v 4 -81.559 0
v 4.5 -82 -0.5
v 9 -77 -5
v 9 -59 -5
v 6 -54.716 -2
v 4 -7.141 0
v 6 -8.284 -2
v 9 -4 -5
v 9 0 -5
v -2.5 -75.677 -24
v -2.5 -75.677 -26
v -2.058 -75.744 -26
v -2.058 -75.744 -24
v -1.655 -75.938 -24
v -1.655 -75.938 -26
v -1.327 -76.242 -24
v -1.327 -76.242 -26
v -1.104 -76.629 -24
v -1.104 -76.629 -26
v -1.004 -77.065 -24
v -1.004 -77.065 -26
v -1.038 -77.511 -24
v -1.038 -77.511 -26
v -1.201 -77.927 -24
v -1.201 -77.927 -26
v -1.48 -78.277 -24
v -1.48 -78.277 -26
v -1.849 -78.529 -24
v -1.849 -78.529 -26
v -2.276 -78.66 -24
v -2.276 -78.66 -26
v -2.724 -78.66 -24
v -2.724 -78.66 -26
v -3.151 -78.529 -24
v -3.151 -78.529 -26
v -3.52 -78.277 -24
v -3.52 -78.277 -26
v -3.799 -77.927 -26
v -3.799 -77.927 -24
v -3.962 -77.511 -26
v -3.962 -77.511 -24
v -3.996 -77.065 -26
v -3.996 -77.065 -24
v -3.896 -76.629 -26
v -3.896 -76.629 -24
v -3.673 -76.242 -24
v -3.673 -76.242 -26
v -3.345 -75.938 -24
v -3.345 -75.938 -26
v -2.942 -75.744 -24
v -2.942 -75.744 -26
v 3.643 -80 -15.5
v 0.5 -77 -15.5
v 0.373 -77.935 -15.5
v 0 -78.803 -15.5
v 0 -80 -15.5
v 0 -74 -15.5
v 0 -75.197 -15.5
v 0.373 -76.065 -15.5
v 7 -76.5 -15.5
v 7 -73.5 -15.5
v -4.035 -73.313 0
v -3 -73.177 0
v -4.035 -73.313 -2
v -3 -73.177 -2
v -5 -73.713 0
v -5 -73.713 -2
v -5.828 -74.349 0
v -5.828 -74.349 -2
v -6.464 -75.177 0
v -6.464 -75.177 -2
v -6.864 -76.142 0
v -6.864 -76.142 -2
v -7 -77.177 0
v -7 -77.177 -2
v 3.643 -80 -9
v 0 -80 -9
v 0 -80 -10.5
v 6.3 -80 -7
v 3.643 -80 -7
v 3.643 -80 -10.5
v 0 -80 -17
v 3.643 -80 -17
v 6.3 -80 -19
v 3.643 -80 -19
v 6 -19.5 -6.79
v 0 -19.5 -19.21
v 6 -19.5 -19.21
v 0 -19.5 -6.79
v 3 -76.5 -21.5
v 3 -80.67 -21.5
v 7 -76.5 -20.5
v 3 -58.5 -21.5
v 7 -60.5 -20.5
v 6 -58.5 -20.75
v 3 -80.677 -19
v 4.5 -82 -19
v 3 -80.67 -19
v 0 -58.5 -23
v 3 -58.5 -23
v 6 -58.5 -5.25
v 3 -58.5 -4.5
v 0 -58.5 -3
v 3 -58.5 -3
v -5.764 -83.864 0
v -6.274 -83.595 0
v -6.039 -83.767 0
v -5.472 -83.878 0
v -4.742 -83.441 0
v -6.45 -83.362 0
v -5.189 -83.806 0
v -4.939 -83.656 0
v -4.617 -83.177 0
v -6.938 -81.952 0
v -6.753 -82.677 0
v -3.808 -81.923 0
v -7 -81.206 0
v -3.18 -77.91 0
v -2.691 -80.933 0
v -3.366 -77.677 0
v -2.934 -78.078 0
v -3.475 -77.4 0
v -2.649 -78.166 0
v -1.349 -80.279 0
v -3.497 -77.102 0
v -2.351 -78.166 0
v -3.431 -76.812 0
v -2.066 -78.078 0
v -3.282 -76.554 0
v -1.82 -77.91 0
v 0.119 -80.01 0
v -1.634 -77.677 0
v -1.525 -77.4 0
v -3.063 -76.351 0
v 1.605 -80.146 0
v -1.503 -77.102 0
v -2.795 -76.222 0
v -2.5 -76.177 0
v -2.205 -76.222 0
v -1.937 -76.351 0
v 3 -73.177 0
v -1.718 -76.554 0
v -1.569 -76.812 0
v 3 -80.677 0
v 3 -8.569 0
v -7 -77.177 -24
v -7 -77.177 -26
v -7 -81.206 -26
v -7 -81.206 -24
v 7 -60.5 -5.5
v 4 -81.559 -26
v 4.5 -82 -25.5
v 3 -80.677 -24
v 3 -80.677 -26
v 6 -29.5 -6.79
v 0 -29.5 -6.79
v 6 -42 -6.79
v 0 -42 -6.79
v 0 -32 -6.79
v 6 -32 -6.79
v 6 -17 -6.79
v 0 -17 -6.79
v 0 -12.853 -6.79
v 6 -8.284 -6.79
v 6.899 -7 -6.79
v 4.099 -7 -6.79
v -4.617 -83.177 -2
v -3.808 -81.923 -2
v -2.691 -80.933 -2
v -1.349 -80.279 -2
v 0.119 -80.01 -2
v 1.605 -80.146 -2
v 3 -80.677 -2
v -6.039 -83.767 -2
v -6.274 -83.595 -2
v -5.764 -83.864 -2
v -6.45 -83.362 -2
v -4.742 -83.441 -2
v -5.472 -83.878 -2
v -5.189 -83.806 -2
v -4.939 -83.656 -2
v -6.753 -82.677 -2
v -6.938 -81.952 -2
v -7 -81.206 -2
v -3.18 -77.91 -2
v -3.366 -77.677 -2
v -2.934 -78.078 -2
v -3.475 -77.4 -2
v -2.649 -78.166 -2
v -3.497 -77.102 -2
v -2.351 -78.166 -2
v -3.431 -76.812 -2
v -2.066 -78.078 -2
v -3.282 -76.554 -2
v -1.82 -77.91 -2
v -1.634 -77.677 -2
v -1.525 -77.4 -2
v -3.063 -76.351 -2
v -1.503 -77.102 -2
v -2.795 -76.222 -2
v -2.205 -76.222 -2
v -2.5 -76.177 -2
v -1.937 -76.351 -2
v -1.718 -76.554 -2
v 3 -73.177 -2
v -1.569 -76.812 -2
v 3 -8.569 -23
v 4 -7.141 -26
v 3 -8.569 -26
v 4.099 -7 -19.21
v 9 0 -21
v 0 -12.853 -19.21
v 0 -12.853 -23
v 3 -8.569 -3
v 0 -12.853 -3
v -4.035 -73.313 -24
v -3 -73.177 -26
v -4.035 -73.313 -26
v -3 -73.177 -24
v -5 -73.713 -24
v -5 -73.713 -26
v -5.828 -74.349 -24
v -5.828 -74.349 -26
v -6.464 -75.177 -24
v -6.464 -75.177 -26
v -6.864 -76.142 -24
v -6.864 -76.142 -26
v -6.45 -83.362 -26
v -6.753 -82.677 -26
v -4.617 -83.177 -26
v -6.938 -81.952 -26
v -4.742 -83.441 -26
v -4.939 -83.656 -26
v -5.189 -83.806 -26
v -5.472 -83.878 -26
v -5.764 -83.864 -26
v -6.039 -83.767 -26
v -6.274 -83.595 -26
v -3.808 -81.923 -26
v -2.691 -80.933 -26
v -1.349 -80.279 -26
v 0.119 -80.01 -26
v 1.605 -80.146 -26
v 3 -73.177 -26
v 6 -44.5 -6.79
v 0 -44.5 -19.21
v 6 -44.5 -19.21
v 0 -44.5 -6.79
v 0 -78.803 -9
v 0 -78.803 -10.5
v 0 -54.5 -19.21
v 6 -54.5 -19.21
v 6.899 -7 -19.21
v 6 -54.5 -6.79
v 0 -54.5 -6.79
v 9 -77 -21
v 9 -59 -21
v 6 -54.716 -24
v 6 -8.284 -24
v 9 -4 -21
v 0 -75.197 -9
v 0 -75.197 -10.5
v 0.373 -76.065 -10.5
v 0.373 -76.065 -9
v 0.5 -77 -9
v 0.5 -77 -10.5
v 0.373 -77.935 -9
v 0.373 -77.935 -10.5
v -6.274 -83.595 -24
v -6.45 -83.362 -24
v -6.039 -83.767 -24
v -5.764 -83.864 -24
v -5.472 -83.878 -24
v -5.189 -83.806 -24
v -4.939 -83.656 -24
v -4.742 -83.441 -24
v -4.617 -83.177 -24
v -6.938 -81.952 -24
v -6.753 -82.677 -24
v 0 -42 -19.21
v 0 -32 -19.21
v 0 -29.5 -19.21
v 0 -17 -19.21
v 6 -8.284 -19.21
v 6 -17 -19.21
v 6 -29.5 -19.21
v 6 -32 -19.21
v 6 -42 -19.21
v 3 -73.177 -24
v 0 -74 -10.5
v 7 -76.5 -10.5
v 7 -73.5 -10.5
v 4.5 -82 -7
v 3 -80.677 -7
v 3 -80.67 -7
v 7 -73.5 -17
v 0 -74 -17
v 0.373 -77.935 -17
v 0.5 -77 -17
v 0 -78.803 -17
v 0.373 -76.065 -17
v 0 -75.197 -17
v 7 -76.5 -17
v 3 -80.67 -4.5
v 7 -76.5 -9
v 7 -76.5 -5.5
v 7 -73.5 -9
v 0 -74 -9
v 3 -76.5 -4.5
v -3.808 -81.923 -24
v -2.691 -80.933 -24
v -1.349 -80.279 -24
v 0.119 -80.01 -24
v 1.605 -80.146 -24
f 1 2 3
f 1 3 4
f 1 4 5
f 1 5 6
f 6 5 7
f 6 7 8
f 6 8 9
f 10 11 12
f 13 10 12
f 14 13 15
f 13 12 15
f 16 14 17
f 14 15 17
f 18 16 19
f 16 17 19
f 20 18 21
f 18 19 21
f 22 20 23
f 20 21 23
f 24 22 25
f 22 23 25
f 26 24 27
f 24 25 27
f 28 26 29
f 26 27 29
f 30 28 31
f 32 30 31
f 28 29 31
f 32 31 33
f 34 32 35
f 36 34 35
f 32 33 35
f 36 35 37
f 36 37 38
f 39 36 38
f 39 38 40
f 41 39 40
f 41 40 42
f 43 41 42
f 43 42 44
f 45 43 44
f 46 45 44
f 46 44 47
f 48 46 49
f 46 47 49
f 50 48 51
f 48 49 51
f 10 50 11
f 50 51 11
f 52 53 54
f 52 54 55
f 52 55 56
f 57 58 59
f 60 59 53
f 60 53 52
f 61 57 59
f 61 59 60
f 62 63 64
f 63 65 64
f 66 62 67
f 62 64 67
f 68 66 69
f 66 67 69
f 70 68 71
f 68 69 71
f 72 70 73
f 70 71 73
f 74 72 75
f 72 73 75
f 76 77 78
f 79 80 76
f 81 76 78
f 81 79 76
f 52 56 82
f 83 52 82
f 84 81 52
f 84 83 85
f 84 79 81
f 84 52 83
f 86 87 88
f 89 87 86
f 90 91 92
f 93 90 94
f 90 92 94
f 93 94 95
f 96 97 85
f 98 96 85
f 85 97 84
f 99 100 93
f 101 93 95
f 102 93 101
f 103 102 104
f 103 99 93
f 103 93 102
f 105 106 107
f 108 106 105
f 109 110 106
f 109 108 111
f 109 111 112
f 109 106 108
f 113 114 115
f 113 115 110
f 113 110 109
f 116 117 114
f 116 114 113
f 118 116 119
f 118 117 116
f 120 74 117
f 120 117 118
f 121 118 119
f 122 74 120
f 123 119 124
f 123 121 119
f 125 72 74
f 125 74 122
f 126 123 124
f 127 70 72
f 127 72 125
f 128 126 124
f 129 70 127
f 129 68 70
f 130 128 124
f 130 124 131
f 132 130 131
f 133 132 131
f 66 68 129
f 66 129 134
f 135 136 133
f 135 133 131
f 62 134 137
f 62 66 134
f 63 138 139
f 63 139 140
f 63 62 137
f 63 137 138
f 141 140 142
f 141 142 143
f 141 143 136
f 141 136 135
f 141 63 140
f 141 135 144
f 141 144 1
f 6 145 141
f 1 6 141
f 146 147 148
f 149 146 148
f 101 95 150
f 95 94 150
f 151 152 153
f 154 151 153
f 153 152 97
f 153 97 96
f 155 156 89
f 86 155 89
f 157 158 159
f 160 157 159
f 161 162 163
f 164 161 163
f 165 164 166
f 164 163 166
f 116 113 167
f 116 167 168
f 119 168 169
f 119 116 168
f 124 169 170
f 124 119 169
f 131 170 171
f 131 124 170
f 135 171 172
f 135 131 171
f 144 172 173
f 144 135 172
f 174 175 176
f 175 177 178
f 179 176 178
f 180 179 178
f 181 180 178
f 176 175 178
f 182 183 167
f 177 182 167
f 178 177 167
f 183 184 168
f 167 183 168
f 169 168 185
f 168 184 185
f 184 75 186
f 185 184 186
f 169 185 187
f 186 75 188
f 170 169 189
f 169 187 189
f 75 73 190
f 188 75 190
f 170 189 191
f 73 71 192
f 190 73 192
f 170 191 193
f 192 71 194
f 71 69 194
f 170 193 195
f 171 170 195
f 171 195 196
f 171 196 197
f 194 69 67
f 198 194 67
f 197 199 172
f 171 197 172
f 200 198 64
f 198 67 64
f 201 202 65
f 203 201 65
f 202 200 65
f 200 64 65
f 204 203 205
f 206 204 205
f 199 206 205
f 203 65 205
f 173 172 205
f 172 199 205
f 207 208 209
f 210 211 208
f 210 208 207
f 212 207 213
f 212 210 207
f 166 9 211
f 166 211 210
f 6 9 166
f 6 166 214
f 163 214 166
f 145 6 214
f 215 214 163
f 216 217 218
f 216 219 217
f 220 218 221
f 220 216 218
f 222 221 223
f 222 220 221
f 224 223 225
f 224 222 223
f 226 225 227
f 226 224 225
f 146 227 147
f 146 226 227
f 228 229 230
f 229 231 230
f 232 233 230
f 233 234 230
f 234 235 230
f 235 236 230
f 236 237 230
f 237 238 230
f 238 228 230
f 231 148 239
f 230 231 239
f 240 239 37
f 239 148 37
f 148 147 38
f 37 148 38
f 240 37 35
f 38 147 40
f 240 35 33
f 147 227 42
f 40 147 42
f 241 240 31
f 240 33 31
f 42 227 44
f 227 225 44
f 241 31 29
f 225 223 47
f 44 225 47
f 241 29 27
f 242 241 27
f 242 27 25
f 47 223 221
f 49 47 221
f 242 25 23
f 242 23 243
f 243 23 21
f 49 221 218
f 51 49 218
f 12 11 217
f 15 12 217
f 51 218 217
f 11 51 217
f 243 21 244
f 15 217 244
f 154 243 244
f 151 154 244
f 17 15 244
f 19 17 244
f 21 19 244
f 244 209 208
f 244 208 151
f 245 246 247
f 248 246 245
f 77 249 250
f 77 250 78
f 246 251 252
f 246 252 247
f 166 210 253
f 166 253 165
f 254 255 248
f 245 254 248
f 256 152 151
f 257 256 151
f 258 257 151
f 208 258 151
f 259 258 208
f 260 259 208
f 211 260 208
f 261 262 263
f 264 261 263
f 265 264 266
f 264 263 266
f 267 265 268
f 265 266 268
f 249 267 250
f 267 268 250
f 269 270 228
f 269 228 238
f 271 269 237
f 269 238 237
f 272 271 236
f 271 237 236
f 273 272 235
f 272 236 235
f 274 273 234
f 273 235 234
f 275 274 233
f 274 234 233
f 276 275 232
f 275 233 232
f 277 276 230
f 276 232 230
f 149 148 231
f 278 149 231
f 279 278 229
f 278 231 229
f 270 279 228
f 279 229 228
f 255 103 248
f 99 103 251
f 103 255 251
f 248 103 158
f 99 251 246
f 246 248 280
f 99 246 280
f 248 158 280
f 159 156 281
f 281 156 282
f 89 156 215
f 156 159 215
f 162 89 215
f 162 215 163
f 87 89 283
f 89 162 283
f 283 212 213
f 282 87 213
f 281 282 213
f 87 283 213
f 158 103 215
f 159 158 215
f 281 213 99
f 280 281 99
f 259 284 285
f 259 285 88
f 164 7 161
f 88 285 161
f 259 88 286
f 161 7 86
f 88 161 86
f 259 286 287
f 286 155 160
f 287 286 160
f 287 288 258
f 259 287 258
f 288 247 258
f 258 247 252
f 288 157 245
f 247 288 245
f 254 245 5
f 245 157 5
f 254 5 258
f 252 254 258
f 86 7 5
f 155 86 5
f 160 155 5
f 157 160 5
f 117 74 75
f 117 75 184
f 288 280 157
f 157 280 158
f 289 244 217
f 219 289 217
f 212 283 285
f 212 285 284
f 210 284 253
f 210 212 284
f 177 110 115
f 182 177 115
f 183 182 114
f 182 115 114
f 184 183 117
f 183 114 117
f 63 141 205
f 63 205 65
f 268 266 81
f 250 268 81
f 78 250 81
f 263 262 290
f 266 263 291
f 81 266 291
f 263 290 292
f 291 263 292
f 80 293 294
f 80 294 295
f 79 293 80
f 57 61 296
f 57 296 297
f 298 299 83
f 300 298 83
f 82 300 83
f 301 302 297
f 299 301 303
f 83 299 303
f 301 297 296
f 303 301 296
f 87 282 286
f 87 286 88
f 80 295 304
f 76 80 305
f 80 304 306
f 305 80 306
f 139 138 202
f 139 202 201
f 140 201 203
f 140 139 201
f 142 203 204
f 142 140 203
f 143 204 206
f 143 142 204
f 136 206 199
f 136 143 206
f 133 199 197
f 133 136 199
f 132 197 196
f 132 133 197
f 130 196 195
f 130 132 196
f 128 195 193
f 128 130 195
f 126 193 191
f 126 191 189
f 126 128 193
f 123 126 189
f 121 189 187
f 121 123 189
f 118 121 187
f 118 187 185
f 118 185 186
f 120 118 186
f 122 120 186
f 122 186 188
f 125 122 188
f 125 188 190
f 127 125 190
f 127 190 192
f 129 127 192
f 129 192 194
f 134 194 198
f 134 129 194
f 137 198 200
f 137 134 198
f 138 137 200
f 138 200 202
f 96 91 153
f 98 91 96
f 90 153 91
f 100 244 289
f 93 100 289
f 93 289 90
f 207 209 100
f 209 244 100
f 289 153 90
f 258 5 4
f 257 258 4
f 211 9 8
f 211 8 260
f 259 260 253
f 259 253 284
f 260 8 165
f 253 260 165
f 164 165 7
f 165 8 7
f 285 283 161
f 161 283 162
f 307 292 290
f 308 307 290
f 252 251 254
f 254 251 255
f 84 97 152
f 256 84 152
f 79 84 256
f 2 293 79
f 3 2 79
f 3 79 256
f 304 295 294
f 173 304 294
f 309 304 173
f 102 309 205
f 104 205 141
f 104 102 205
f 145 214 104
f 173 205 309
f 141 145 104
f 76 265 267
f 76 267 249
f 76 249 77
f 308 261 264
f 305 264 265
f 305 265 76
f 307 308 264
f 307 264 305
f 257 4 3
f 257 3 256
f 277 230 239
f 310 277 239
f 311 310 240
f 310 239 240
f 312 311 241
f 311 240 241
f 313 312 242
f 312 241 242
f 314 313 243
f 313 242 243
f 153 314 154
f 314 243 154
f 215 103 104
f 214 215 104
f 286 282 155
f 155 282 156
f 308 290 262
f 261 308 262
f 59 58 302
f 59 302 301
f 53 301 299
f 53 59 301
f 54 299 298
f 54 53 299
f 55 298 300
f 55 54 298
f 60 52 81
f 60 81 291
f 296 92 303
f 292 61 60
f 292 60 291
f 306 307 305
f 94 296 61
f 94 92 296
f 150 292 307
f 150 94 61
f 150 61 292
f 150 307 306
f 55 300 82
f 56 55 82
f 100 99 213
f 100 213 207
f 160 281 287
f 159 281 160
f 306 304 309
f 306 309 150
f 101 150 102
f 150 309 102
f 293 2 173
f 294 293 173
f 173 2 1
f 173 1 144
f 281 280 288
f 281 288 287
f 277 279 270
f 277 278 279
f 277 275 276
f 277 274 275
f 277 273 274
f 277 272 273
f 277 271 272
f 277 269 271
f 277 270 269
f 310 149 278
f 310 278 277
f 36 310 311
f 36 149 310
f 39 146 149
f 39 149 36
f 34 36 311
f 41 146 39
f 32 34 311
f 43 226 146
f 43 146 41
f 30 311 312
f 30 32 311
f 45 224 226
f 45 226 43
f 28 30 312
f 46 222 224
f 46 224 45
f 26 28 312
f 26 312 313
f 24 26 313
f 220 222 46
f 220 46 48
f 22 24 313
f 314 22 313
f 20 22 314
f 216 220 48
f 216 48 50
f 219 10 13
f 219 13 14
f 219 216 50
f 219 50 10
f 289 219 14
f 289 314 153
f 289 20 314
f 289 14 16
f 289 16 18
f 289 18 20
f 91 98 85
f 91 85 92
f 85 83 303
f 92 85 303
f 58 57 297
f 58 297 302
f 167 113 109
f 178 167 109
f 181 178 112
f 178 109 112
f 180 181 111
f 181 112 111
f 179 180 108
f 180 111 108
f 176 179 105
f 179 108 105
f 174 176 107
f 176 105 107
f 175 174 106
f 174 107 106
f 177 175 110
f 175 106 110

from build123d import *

# Parameters (mm, degrees)
SKETCH_1_W             = 26
SKETCH_1_H             = 82
EXTRUDE_1_DEPTH        = 9
CHAMFER_1_SIZE         = 5
CUT_EXTRUDE_1_DEPTH    = 87.492774265
SKETCH_3_OUTSIDE_W     = 45.298
SKETCH_3_OUTSIDE_H     = 101.298
SKETCH_3_OUTSIDE_W_2   = 20
SKETCH_3_OUTSIDE_H_2   = 55
CUT_EXTRUDE_2_DEPTH    = 3
SKETCH_4_W             = 12.420254628
SKETCH_4_H             = 10
CUT_EXTRUDE_3_DEPTH    = 87.492774265
PATTERN_LINEAR_1_COUNT = 4
PATTERN_LINEAR_1_PITCH = 12.5
CUT_EXTRUDE_4_DEPTH    = 87.492774265
SKETCH_6_W             = 12
SKETCH_6_H             = 2
CUT_EXTRUDE_5_DEPTH    = 87.492774265
SKETCH_7_W             = 15
SKETCH_7_H             = 18
CUT_EXTRUDE_6_DEPTH    = 4
CUT_EXTRUDE_7_DEPTH    = 87.492774265
CHAMFER_2_SIZE         = 1
CHAMFER_2_SIZE2        = 2
CHAMFER_3_SIZE2        = 1
CHAMFER_3_SIZE         = 4
CHAMFER_4_SIZE2        = 4
CHAMFER_4_SIZE         = 1
CHAMFER_5_SIZE         = 4.17
CHAMFER_5_SIZE_2       = 4
RIB_1_DEPTH            = 1.5
SKETCH_10_R            = 3.5
CUT_EXTRUDE_8_DEPTH    = 1.5
EXTRUDE_2_DEPTH        = 2
FILLET_1_R             = 4
FILLET_2_R             = 4.5
SKETCH_12_R            = 1
CUT_EXTRUDE_9_DEPTH    = 2
FILLET_1_OF_MIRROR_2_R = 4
FILLET_2_OF_MIRROR_2_R = 4.5
FILLET_3_R             = 1
SKETCH_13_R            = 1.5
CUT_EXTRUDE_11_DEPTH   = 2


# Read off the part's stored shape, not the designer's step: 筋1
# Some blends are built 0.0001 mm under size
with BuildPart() as part:
    # 草图1 → 凸台-拉伸1 (new body)
    with BuildSketch(Plane(origin=(0, 0, 0), x_dir=(0, 0, -1), z_dir=(1, 0, 0))):
        with Locations((13, -41)):
            Rectangle(SKETCH_1_W, SKETCH_1_H)
    extrude(amount=EXTRUDE_1_DEPTH)

    # 倒角1
    chamfer_1_edges = [part.edges().sort_by_distance(p)[0] for p in [
        (9, -41, -26),
        (9, -41, 0),
    ]]
    chamfer(chamfer_1_edges, length=CHAMFER_1_SIZE)

    # 草图2 → 切除-拉伸1 (cut, through all)
    with BuildSketch(Plane.XY):
        Polygon((9, 0), (0, -12.853332061), (0, 0), align=None)
        Polygon((9, -4), (6, -8.28444402), (6, -54.71555598), (9, -59), align=None)
    extrude(amount=-CUT_EXTRUDE_1_DEPTH, mode=Mode.SUBTRACT)

    # 草图3 outside → 切除-拉伸2 (cut)
    with BuildSketch(Plane.ZY):
        with Locations((-13, -41)):
            Rectangle(SKETCH_3_OUTSIDE_W, SKETCH_3_OUTSIDE_H)
        with Locations((-13, -31)):
            Rectangle(SKETCH_3_OUTSIDE_W_2, SKETCH_3_OUTSIDE_H_2, mode=Mode.SUBTRACT)
    extrude(amount=-CUT_EXTRUDE_2_DEPTH, mode=Mode.SUBTRACT)

    # 草图4 → 切除-拉伸3 (cut, through all)
    with BuildSketch(Plane.ZY):
        with Locations((-13, -12)):
            Rectangle(SKETCH_4_W, SKETCH_4_H)
    cut_extrude_3 = extrude(amount=-CUT_EXTRUDE_3_DEPTH, mode=Mode.SUBTRACT)

    # 阵列(线性)1: 切除-拉伸3 ×4
    with Locations(*[(0, -i * PATTERN_LINEAR_1_PITCH, 0) for i in range(1, PATTERN_LINEAR_1_COUNT)]):
        add(cut_extrude_3, mode=Mode.SUBTRACT)

    # 草图5 → 切除-拉伸4 (cut, through all)
    with BuildSketch(Plane.XY):
        Polygon((9, -77), (9, -82), (4.5, -82), align=None)
    extrude(amount=-CUT_EXTRUDE_4_DEPTH, mode=Mode.SUBTRACT)

    # 草图6 → 切除-拉伸5 (cut, through all)
    with BuildSketch(Plane(origin=(9, 0, 0), x_dir=(0, 0, -1), z_dir=(1, 0, 0))):
        with Locations((13, -81)):
            Rectangle(SKETCH_6_W, SKETCH_6_H)
    extrude(amount=-CUT_EXTRUDE_5_DEPTH, mode=Mode.SUBTRACT)

    # 草图7 → 切除-拉伸6 (cut)
    with BuildSketch(Plane.ZY.offset(-3)):
        with Locations((-13, -67.5)):
            Rectangle(SKETCH_7_W, SKETCH_7_H)
    extrude(amount=-CUT_EXTRUDE_6_DEPTH, mode=Mode.SUBTRACT)

    # 草图8 → 切除-拉伸7 (cut, through all)
    with BuildSketch(Plane.XY):
        Polygon((4.5, -82), (3, -80.677124344), (3, -82), align=None)
    extrude(amount=-CUT_EXTRUDE_7_DEPTH, mode=Mode.SUBTRACT)

    # 倒角2
    chamfer_2_edges = [part.edges().sort_by_distance(p)[0] for p in [
        (7, -58.5, -13),
    ]]
    chamfer_2_side = [part.faces().sort_by_distance(p)[0] for p in [
        (3.25, -58.5, -13),
    ]]
    chamfer(chamfer_2_edges, length=CHAMFER_2_SIZE, length2=CHAMFER_2_SIZE2, reference=chamfer_2_side[0])

    # 倒角3
    chamfer_3_edges = [part.edges().sort_by_distance(p)[0] for p in [
        (3, -67.5, -5.5),
    ]]
    chamfer_3_side = [part.faces().sort_by_distance(p)[0] for p in [
        (3.02, -67.5, -5.5),
    ]]
    chamfer(chamfer_3_edges, length=CHAMFER_3_SIZE - 0.0001, length2=CHAMFER_3_SIZE2 - 0.0001, reference=chamfer_3_side[0])  # a hair under: the kernel refuses the full size

    # 倒角4
    chamfer_4_edges = [part.edges().sort_by_distance(p)[0] for p in [
        (3, -67.5, -20.5),
    ]]
    chamfer_4_side = [part.faces().sort_by_distance(p)[0] for p in [
        (3, -67.5, -20.52),
    ]]
    chamfer(chamfer_4_edges, length=CHAMFER_4_SIZE - 0.0001, length2=CHAMFER_4_SIZE2 - 0.0001, reference=chamfer_4_side[0])  # a hair under: the kernel refuses the full size

    # 倒角5
    # the kernel refuses this chamfer: 4.17, 4 mm, written as the material it takes off along each edge
    with BuildSketch(Plane(origin=(3, -76.5, 6.229717564), x_dir=(-0.026903120245147794, -0.9996380455550276, 0), z_dir=(0, 0, -1))) as chamfer_5_piece_1_section:
        Polygon((CHAMFER_5_SIZE * 0.999638045555, -CHAMFER_5_SIZE * 0.0269031202451), (-CHAMFER_5_SIZE_2 * 0.0269031202451, -CHAMFER_5_SIZE_2 * 0.999638045555), (0, 0), align=None)
    chamfer_5_piece_1 = extrude(amount=38.459435128, mode=Mode.PRIVATE)
    chamfer_5_piece_1 = split(chamfer_5_piece_1, bisect_by=Plane(origin=(3.319672902, -80.226492904, -4.580012231), z_dir=(-0.24251850433325217, 0, -0.9701467801605912)), keep=Keep.TOP, mode=Mode.PRIVATE)
    chamfer_5_piece_1 = split(chamfer_5_piece_1, bisect_by=Plane(origin=(7.071862718, -80.226492904, -20.48201067), z_dir=(-0.24251850433325217, 0, 0.9701467801605912)), keep=Keep.TOP, mode=Mode.PRIVATE)
    add(chamfer_5_piece_1, mode=Mode.SUBTRACT)

    # 筋1 outline → 筋1 (add)
    with BuildSketch(Plane.XY.offset(-10.5)):
        Polygon((0, -74), (0, -80), (3.642685851, -80), (7, -76.5), (7, -73.5), align=None)
    rib_1 = extrude(amount=RIB_1_DEPTH)

    # 草图10 → 切除-拉伸8 (cut)
    with BuildSketch(Plane(origin=(0, 0, -10.5), x_dir=(-1, 0, 0), z_dir=(0, 0, -1))):
        with Locations((3, -77)):
            Circle(SKETCH_10_R)
    cut_extrude_8 = extrude(amount=-CUT_EXTRUDE_8_DEPTH, mode=Mode.SUBTRACT)

    # 镜向1: 筋1, 切除-拉伸8 across plane
    add(rib_1.mirror(Plane.XY.offset(-13)))
    add(cut_extrude_8.mirror(Plane.XY.offset(-13)), mode=Mode.SUBTRACT)

    # 草图11 → 凸台-拉伸2 (add)
    with BuildSketch(Plane(origin=(0, 0, -26), x_dir=(-1, 0, 0), z_dir=(0, 0, -1))):
        with BuildLine():
            Line((-3, -80.677124344), (-3, -73.177124344))
            Line((-3, -73.177124344), (7, -73.177124344))
            Line((7, -73.177124344), (7, -85.177124344))
            Line((7, -85.177124344), (4.616572218, -85.177124344))
            Line((4.616572218, -85.177124344), (4.616572218, -83.177124344))
            ThreePointArc((4.616572218, -83.177124344), (1.349260187, -80.278977091), (-3, -80.677124344))
        make_face()
    extrude_2 = extrude(amount=-EXTRUDE_2_DEPTH)

    # 圆角1
    fillet_1_edges = [part.edges().sort_by_distance(p)[0] for p in [
        (-7, -73.177124344, -25),
    ]]
    fillet(fillet_1_edges, radius=FILLET_1_R)

    # 圆角2
    # the kernel refuses this fillet: 4.5 mm, written as the material it takes off along each edge
    with BuildSketch(Plane(origin=(-7, -85.177124344, -35.927903243), x_dir=(0, 1, 0), z_dir=(0, 0, 1))) as fillet_2_piece_1:
        with BuildLine():
            CenterArc((3.971161297, -4.5), FILLET_2_R, 90, 61.943021953)
            Line((0, -2.383427782), (-0.079423226, -2.341096338))
            ThreePointArc((-0.079423226, -2.341096338), (-0.09, -1.191713891), (-0.09, 0))
            Line((-0.09, 0), (0, 0.09))
            Line((0, 0.09), (3.971161297, 0.09))
            Line((3.971161297, 0.09), (3.971161297, 0))
        make_face()
    extrude(amount=21.855806485, mode=Mode.SUBTRACT)

    # 草图12 → 切除-拉伸9 (cut)
    with BuildSketch(Plane(origin=(0, 0, -26), x_dir=(-1, 0, 0), z_dir=(0, 0, -1))):
        with Locations(Location((2.5, -77.177124344, 0), (0, 0, 90))):
            Circle(SKETCH_12_R)
    cut_extrude_9 = extrude(amount=-CUT_EXTRUDE_9_DEPTH, mode=Mode.SUBTRACT)

    # 镜向2: 凸台-拉伸2, 切除-拉伸9 across plane
    add(extrude_2.mirror(Plane.XY.offset(-13)))
    add(cut_extrude_9.mirror(Plane.XY.offset(-13)), mode=Mode.SUBTRACT)

    # 圆角1 of 镜向2
    fillet_1_of_mirror_2_edges = [part.edges().sort_by_distance(p)[0] for p in [
        (-7, -73.177124344, -1),
    ]]
    fillet(fillet_1_of_mirror_2_edges, radius=FILLET_1_OF_MIRROR_2_R)

    # 圆角2 of 镜向2
    # the kernel refuses this fillet: 4.5 mm, written as the material it takes off along each edge
    with BuildSketch(Plane(origin=(-7, -85.177124344, 9.927903243), x_dir=(0, 1, 0), z_dir=(0, 0, -1))) as fillet_2_of_mirror_2_piece_1:
        with BuildLine():
            CenterArc((3.971161297, 4.5), FILLET_2_OF_MIRROR_2_R, 208.056978047, 61.943021953)
            Line((0, 2.383427782), (-0.079423226, 2.341096338))
            ThreePointArc((-0.079423226, 2.341096338), (-0.09, 1.191713891), (-0.09, 0))
            Line((-0.09, 0), (0, -0.09))
            Line((0, -0.09), (3.971161297, -0.09))
            Line((3.971161297, -0.09), (3.971161297, 0))
        make_face()
    extrude(amount=21.855806485, mode=Mode.SUBTRACT)

    # 圆角3
    # the kernel refuses this fillet: 1 mm, written as the material it takes off along each edge
    with BuildSketch(Plane(origin=(-4.616572218, -85.177124344, -32.450380338), x_dir=(-0.7105970280063522, 0.7035992209976782, 0), z_dir=(0, 0, 1))) as fillet_3_piece_1:
        with BuildLine():
            CenterArc((2.293468564, -0.958025329), FILLET_3_R, 73.340489996, 134.251279475)
            Line((1.407198442, -1.421194056), (1.38947304, -1.430457431))
            ThreePointArc((1.38947304, -1.430457431), (0.68938728, -0.724669012), (-0.014211941, -0.014071984))
            Line((-0.014211941, -0.014071984), (-0.005733671, 0.019160507))
            ThreePointArc((-0.005733671, 0.019160507), (1.290076068, 0.208886021), (2.585885806, 0.019160507))
            Line((2.585885806, 0.019160507), (2.580152135, 0))
        make_face()
    extrude(amount=14.900760675, mode=Mode.SUBTRACT)
    with BuildSketch(Plane(origin=(-4.616572218, -85.177124344, 6.450380338), x_dir=(0, 1, 0), z_dir=(0, 0, -1))) as fillet_3_piece_2:
        with BuildLine():
            CenterArc((2.294452647, -0.955666071), FILLET_3_R, 107.12471858, 134.251279475)
            Line((1.815393032, -1.833448439), (1.80581184, -1.851004086))
            ThreePointArc((1.80581184, -1.851004086), (0.75926273, -1.063696261), (-0.017649606, -0.009406988))
            Line((-0.017649606, -0.009406988), (0, 0.02))
            ThreePointArc((0, 0.02), (1, 0.02), (1.994110947, 0.019113321))
            Line((1.994110947, 0.019113321), (2, 0))
        make_face()
    extrude(amount=14.900760675, mode=Mode.SUBTRACT)

    # 草图13 → 切除-拉伸11 (cut)
    with BuildSketch(Plane(origin=(0, 0, -26), x_dir=(-1, 0, 0), z_dir=(0, 0, -1))):
        with Locations(Location((2.5, -77.177124344, 0), (0, 0, 90))):
            Circle(SKETCH_13_R)
    extrude(amount=-CUT_EXTRUDE_11_DEPTH, mode=Mode.SUBTRACT)


solid = part.part
